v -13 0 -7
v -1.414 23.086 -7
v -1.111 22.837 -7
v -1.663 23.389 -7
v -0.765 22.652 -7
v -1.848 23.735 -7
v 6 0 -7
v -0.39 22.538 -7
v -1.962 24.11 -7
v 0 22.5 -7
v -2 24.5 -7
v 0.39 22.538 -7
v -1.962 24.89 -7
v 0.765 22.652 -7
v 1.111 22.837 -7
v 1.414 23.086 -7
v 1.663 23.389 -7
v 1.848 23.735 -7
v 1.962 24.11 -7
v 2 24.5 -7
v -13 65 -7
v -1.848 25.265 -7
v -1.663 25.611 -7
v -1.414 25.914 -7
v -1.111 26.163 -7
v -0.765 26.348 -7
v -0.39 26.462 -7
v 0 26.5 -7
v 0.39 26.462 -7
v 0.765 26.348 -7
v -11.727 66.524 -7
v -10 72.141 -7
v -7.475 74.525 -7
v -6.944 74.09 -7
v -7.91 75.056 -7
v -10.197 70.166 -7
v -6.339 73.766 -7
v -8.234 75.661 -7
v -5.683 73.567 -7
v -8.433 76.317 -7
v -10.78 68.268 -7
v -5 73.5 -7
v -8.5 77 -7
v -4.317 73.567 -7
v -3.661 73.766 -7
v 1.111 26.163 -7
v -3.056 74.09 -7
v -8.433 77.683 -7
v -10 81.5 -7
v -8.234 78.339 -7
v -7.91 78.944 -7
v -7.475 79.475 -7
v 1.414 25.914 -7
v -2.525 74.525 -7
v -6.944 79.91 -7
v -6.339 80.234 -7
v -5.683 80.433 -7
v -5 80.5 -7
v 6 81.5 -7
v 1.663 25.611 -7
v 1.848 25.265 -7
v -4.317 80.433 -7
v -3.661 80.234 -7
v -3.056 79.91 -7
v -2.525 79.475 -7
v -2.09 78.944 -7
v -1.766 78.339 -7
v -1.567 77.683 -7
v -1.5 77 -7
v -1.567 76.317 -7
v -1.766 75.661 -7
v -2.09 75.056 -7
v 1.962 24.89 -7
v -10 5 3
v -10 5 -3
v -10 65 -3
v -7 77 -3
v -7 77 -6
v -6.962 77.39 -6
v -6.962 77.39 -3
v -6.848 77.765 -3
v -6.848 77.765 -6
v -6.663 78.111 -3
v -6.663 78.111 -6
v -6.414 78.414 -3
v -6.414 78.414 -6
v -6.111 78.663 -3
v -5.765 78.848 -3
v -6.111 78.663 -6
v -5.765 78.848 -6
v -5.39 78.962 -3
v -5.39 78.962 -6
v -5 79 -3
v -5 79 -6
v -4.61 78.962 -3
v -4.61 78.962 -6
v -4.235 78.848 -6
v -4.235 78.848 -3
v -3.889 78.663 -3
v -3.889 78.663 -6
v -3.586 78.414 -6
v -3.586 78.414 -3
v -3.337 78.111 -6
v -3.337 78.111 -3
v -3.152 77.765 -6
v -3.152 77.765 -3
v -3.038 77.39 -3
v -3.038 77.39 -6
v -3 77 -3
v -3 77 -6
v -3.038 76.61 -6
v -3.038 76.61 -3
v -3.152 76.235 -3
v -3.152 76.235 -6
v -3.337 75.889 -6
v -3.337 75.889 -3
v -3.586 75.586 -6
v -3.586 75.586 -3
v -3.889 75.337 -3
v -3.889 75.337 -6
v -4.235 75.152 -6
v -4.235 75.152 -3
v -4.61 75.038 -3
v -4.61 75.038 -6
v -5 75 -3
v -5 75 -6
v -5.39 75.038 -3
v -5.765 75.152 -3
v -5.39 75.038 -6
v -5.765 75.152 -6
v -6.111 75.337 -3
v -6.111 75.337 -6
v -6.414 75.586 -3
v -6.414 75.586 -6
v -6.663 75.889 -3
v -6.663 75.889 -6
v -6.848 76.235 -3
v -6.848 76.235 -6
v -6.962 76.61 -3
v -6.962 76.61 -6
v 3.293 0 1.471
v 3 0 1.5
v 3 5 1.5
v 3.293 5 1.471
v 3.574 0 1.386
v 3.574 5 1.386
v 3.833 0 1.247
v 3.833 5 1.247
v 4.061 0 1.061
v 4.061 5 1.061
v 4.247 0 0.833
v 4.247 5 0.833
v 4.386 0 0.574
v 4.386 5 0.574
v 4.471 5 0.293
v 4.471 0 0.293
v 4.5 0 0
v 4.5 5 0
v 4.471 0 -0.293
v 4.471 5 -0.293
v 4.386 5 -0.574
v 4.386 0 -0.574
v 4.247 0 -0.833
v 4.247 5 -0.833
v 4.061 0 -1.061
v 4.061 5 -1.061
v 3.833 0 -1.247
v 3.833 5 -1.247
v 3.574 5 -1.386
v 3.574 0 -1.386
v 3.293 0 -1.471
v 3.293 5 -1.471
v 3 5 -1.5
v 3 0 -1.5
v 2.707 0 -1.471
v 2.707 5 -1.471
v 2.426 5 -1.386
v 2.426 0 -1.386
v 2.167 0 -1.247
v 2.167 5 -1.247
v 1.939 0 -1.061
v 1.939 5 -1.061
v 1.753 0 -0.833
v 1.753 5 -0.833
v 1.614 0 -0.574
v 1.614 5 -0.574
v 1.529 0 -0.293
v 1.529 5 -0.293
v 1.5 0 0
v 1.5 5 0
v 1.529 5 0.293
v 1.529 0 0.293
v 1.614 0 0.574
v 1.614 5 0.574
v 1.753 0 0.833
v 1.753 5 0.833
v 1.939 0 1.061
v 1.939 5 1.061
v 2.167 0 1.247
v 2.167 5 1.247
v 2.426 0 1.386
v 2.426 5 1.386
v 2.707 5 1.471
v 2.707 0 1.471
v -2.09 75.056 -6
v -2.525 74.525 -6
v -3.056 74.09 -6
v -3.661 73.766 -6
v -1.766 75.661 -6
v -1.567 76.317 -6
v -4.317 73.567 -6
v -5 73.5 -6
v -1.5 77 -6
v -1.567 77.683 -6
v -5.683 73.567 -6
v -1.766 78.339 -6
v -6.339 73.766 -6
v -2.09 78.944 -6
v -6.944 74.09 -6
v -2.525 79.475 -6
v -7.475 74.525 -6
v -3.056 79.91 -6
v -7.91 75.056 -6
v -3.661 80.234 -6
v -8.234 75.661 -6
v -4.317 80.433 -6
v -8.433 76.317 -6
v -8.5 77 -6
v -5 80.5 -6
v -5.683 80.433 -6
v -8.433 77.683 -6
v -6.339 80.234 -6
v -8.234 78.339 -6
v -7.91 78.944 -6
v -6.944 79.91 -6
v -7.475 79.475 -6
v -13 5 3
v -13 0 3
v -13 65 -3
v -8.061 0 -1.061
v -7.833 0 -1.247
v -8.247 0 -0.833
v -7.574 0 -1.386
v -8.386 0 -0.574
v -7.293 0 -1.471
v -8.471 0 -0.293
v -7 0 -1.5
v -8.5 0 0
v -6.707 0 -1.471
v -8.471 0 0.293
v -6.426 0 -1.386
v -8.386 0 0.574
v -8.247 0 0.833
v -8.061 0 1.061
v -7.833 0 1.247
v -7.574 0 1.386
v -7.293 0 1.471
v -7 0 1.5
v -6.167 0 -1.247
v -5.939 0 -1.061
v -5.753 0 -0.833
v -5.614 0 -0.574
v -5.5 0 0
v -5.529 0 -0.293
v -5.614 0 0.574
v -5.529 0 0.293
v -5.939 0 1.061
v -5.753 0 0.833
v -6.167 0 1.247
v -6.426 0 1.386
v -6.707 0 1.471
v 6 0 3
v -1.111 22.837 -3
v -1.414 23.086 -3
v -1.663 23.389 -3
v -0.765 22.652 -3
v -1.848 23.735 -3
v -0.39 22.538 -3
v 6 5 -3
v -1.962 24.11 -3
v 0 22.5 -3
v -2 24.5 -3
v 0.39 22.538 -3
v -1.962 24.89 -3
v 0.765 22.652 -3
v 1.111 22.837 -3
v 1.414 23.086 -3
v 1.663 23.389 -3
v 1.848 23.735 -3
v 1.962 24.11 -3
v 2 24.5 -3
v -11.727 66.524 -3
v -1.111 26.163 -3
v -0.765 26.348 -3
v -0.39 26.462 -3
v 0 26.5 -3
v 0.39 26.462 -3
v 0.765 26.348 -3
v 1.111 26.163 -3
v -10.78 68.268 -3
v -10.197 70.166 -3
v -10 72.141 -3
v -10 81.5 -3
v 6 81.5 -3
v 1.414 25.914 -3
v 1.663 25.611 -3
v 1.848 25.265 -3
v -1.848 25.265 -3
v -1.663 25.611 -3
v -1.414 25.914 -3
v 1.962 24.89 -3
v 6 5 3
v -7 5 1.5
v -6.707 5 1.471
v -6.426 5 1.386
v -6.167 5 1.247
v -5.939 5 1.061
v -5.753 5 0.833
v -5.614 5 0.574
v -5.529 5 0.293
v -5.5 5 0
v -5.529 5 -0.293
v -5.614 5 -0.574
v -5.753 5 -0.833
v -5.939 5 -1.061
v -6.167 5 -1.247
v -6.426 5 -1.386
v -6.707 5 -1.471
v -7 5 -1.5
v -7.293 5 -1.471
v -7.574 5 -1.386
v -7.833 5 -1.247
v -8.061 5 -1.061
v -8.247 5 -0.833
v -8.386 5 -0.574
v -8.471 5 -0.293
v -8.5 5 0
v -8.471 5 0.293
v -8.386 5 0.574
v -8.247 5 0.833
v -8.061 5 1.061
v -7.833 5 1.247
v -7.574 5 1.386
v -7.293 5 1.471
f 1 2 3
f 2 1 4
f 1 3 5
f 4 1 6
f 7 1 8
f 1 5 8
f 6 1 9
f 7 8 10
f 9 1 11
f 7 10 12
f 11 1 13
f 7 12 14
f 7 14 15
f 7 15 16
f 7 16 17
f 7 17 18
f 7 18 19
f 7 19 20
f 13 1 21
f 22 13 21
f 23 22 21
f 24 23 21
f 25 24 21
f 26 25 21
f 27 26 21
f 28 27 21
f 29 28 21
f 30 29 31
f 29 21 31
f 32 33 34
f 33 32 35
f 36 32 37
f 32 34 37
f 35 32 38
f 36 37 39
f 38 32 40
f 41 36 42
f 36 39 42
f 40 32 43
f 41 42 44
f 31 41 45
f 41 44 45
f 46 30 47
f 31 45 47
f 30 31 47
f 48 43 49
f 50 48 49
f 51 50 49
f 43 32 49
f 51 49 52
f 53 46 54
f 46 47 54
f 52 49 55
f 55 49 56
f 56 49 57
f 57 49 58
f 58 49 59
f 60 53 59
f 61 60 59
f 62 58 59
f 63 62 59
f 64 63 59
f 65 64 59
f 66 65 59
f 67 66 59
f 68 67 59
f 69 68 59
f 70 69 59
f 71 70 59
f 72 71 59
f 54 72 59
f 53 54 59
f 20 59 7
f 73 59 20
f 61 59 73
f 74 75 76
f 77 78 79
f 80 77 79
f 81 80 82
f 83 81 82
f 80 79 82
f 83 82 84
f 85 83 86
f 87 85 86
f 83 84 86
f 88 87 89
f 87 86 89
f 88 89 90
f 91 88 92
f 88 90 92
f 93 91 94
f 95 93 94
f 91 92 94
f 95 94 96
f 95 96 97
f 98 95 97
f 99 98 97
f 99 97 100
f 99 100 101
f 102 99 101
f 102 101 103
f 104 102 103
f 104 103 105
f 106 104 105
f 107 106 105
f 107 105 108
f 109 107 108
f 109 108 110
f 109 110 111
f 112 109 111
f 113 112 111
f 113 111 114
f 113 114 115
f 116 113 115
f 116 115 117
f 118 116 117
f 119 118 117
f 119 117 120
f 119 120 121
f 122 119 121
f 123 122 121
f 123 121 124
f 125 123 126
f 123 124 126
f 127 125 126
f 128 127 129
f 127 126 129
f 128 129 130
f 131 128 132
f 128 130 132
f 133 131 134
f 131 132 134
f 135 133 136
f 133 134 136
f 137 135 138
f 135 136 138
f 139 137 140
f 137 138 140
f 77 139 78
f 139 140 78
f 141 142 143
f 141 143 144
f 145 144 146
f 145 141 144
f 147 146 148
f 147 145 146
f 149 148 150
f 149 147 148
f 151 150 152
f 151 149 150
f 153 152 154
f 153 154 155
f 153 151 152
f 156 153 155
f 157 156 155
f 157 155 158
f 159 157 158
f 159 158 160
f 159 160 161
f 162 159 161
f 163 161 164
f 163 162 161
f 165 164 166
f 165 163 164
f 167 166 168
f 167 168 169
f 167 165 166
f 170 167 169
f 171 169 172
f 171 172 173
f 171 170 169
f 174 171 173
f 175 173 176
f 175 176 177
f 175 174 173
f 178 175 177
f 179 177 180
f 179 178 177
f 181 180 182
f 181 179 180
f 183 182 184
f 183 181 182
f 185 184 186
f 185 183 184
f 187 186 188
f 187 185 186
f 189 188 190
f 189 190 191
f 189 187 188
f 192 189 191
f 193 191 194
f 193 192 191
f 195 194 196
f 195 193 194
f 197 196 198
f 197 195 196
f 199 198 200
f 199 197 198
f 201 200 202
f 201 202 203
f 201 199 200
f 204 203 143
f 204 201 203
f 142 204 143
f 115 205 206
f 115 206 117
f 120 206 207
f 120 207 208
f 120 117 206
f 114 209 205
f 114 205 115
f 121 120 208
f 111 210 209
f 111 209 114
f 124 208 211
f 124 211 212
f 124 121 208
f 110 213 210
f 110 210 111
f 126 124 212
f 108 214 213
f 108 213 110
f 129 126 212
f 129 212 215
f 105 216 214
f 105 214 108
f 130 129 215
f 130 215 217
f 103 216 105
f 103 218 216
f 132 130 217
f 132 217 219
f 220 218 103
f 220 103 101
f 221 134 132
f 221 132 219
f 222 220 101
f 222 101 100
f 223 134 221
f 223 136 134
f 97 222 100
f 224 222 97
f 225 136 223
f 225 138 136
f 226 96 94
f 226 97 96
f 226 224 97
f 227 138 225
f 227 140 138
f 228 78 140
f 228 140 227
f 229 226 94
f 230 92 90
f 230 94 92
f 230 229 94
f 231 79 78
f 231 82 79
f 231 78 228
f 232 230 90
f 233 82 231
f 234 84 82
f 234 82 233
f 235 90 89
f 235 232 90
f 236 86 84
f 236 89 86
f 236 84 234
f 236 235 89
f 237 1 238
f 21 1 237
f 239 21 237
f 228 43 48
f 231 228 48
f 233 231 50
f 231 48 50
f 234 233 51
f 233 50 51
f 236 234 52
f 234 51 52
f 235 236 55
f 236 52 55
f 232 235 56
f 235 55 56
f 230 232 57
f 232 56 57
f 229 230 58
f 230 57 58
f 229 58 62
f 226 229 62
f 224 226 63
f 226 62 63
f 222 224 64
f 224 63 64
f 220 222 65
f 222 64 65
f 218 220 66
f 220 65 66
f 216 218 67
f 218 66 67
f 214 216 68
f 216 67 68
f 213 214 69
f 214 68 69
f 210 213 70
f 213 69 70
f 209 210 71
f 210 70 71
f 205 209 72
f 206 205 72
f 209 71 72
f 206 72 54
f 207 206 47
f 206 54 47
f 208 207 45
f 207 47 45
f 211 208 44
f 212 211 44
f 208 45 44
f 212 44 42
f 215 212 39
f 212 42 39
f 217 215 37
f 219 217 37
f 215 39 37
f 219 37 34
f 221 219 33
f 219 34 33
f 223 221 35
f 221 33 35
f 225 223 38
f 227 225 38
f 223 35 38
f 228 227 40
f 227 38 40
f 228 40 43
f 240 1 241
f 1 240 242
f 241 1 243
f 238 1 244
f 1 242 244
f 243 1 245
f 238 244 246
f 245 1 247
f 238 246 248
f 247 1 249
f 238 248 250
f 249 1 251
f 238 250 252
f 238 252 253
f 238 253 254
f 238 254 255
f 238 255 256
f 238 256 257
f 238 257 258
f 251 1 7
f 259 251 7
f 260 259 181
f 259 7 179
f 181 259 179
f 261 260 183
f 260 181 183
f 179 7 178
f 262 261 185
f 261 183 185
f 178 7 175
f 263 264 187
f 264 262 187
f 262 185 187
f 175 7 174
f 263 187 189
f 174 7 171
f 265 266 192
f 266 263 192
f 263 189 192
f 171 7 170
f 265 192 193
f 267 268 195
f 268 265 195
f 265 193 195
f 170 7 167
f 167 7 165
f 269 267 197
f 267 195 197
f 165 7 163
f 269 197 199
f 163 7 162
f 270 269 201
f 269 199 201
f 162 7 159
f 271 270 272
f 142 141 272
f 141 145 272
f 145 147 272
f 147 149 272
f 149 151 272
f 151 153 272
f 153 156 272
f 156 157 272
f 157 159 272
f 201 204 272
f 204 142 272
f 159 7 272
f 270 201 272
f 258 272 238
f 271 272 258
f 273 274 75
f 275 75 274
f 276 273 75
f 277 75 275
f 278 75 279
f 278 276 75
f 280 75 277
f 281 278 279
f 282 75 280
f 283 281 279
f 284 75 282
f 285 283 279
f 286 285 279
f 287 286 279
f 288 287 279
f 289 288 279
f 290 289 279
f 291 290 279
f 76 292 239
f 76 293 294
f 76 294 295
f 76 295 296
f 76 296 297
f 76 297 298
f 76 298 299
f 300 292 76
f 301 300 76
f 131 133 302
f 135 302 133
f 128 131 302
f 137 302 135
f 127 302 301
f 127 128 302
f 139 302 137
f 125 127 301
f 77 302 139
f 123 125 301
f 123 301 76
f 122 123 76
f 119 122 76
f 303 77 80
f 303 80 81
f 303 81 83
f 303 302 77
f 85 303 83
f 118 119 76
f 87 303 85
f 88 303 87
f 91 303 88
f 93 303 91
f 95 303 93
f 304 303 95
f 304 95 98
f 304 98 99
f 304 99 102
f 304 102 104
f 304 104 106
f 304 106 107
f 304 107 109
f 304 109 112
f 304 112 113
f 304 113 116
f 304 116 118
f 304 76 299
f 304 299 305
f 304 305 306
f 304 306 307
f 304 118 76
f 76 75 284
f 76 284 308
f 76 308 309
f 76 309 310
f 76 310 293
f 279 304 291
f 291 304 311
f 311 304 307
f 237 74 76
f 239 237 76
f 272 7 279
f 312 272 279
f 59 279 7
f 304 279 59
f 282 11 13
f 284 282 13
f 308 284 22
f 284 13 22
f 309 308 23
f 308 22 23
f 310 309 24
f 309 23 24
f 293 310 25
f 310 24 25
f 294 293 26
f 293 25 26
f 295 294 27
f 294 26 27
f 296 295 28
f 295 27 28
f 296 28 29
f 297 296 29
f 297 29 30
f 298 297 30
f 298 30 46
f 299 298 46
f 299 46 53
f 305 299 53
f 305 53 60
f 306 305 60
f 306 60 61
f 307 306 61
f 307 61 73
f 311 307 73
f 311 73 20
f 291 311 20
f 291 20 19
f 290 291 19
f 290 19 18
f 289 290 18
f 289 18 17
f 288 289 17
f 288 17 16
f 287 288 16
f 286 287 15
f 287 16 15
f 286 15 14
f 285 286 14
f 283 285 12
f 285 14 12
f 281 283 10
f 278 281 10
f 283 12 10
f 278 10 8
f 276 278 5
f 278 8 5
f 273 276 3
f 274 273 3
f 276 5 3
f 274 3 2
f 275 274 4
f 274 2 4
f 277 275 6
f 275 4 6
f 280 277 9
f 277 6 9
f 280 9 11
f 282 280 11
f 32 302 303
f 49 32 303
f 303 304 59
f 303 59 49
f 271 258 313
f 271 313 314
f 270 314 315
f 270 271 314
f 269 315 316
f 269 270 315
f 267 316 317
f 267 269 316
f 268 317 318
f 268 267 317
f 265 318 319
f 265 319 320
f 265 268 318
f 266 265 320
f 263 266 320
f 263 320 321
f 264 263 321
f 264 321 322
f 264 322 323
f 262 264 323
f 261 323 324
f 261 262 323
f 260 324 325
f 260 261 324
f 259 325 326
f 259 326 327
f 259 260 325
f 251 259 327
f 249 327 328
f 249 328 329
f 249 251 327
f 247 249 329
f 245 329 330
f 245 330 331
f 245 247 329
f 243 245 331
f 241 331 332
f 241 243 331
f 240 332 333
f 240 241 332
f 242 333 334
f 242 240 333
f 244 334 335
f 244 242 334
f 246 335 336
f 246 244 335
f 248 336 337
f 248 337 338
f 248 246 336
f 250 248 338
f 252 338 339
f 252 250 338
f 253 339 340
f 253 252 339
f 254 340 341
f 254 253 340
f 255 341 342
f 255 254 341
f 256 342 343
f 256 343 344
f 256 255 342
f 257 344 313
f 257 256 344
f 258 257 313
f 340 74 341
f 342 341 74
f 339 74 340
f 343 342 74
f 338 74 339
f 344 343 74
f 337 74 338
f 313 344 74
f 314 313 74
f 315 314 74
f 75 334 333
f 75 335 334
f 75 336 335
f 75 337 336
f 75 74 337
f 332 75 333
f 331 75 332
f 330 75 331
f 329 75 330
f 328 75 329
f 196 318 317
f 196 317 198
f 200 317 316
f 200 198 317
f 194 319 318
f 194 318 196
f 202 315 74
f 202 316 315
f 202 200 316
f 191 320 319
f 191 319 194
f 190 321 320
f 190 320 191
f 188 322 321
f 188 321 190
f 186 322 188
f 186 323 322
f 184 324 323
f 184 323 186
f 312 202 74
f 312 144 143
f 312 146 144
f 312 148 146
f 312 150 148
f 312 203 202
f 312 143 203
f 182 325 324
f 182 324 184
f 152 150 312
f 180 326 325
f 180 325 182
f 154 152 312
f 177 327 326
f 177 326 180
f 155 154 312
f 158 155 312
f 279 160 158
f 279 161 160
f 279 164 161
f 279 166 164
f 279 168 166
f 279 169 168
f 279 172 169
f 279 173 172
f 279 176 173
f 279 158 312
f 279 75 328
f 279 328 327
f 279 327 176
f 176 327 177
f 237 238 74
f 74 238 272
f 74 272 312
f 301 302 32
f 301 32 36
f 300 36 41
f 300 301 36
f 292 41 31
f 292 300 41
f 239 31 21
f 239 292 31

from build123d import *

# Parameters (mm, degrees)
SKETCH_1_W          = 16
SKETCH_1_H          = 6
SKETCH_1_R          = 1.5
EXTRUDE_1_DEPTH     = 5
SKETCH_2_W          = 16
SKETCH_2_H          = 81.5
EXTRUDE_2_DEPTH     = 4
SKETCH_3_R          = 2
CUT_EXTRUDE_1_DEPTH = 83.717894074
SKETCH_4_R          = 2
CUT_EXTRUDE_2_DEPTH = 83.717894074
SKETCH_5_R          = 3.5
CUT_EXTRUDE_3_DEPTH = 1
EXTRUDE_3_DEPTH     = 3
FILLET_1_R          = 10


with BuildPart() as part:
    # 草图1 → 凸台-拉伸1 (new body)
    with BuildSketch(Plane(origin=(0, 0, 0), x_dir=(1, 0, 0), z_dir=(0, 1, 0))):
        with Locations((-2, 0)):
            Rectangle(SKETCH_1_W, SKETCH_1_H)
        with Locations(Location((-7, 0, 0), (0, 0, 270))):
            Circle(SKETCH_1_R, mode=Mode.SUBTRACT)
        with Locations(Location((3, 0, 0), (0, 0, 270))):
            Circle(SKETCH_1_R, mode=Mode.SUBTRACT)
    extrude(amount=EXTRUDE_1_DEPTH)

    # 草图2 → 凸台-拉伸2 (add)
    with BuildSketch(Plane(origin=(0, 0, -3), x_dir=(-1, 0, 0), z_dir=(0, 0, -1))):
        with Locations((2, 40.75)):
            Rectangle(SKETCH_2_W, SKETCH_2_H)
    extrude(amount=EXTRUDE_2_DEPTH)

    # 草图3 → 切除-拉伸1 (cut, through all)
    with BuildSketch(Plane(origin=(0, 0, -7), x_dir=(-1, 0, 0), z_dir=(0, 0, -1))):
        with Locations((5, 77)):
            Circle(SKETCH_3_R)
    extrude(amount=-CUT_EXTRUDE_1_DEPTH, mode=Mode.SUBTRACT)

    # 草图4 → 切除-拉伸2 (cut, through all)
    with BuildSketch(Plane(origin=(0, 0, -7), x_dir=(-1, 0, 0), z_dir=(0, 0, -1))):
        with Locations((0, 24.5)):
            Circle(SKETCH_4_R)
    extrude(amount=-CUT_EXTRUDE_2_DEPTH, mode=Mode.SUBTRACT)

    # 草图5 → 切除-拉伸3 (cut)
    with BuildSketch(Plane(origin=(0, 0, -7), x_dir=(-1, 0, 0), z_dir=(0, 0, -1))):
        with Locations((5, 77)):
            Circle(SKETCH_5_R)
    extrude(amount=-CUT_EXTRUDE_3_DEPTH, mode=Mode.SUBTRACT)

    # 草图6 → 凸台-拉伸3 (add)
    with BuildSketch(Plane.ZY.offset(10)):
        Polygon((3, 5), (-3, 5), (-3, 65), (-7, 65), (-7, 0), (3, 0), align=None)
        Polygon((-3, 65), (-3, 5), (3, 5), align=None)
    extrude(amount=EXTRUDE_3_DEPTH)

    # 圆角1
    # the kernel refuses this fillet: 10 mm, written as the material it adds along each edge
    with BuildSketch(Plane(origin=(-10, 65, -3), x_dir=(-1, 0, 0), z_dir=(0, 0, -1))) as fillet_1_piece_1:
        with BuildLine():
            CenterArc((10, 7.141428429), FILLET_1_R, 180, 45.572995999)
            Line((0, 7.141428429), (0, 0))
            Line((0, 0), (3, 0))
        make_face()
    extrude(amount=4)


solid = part.part
